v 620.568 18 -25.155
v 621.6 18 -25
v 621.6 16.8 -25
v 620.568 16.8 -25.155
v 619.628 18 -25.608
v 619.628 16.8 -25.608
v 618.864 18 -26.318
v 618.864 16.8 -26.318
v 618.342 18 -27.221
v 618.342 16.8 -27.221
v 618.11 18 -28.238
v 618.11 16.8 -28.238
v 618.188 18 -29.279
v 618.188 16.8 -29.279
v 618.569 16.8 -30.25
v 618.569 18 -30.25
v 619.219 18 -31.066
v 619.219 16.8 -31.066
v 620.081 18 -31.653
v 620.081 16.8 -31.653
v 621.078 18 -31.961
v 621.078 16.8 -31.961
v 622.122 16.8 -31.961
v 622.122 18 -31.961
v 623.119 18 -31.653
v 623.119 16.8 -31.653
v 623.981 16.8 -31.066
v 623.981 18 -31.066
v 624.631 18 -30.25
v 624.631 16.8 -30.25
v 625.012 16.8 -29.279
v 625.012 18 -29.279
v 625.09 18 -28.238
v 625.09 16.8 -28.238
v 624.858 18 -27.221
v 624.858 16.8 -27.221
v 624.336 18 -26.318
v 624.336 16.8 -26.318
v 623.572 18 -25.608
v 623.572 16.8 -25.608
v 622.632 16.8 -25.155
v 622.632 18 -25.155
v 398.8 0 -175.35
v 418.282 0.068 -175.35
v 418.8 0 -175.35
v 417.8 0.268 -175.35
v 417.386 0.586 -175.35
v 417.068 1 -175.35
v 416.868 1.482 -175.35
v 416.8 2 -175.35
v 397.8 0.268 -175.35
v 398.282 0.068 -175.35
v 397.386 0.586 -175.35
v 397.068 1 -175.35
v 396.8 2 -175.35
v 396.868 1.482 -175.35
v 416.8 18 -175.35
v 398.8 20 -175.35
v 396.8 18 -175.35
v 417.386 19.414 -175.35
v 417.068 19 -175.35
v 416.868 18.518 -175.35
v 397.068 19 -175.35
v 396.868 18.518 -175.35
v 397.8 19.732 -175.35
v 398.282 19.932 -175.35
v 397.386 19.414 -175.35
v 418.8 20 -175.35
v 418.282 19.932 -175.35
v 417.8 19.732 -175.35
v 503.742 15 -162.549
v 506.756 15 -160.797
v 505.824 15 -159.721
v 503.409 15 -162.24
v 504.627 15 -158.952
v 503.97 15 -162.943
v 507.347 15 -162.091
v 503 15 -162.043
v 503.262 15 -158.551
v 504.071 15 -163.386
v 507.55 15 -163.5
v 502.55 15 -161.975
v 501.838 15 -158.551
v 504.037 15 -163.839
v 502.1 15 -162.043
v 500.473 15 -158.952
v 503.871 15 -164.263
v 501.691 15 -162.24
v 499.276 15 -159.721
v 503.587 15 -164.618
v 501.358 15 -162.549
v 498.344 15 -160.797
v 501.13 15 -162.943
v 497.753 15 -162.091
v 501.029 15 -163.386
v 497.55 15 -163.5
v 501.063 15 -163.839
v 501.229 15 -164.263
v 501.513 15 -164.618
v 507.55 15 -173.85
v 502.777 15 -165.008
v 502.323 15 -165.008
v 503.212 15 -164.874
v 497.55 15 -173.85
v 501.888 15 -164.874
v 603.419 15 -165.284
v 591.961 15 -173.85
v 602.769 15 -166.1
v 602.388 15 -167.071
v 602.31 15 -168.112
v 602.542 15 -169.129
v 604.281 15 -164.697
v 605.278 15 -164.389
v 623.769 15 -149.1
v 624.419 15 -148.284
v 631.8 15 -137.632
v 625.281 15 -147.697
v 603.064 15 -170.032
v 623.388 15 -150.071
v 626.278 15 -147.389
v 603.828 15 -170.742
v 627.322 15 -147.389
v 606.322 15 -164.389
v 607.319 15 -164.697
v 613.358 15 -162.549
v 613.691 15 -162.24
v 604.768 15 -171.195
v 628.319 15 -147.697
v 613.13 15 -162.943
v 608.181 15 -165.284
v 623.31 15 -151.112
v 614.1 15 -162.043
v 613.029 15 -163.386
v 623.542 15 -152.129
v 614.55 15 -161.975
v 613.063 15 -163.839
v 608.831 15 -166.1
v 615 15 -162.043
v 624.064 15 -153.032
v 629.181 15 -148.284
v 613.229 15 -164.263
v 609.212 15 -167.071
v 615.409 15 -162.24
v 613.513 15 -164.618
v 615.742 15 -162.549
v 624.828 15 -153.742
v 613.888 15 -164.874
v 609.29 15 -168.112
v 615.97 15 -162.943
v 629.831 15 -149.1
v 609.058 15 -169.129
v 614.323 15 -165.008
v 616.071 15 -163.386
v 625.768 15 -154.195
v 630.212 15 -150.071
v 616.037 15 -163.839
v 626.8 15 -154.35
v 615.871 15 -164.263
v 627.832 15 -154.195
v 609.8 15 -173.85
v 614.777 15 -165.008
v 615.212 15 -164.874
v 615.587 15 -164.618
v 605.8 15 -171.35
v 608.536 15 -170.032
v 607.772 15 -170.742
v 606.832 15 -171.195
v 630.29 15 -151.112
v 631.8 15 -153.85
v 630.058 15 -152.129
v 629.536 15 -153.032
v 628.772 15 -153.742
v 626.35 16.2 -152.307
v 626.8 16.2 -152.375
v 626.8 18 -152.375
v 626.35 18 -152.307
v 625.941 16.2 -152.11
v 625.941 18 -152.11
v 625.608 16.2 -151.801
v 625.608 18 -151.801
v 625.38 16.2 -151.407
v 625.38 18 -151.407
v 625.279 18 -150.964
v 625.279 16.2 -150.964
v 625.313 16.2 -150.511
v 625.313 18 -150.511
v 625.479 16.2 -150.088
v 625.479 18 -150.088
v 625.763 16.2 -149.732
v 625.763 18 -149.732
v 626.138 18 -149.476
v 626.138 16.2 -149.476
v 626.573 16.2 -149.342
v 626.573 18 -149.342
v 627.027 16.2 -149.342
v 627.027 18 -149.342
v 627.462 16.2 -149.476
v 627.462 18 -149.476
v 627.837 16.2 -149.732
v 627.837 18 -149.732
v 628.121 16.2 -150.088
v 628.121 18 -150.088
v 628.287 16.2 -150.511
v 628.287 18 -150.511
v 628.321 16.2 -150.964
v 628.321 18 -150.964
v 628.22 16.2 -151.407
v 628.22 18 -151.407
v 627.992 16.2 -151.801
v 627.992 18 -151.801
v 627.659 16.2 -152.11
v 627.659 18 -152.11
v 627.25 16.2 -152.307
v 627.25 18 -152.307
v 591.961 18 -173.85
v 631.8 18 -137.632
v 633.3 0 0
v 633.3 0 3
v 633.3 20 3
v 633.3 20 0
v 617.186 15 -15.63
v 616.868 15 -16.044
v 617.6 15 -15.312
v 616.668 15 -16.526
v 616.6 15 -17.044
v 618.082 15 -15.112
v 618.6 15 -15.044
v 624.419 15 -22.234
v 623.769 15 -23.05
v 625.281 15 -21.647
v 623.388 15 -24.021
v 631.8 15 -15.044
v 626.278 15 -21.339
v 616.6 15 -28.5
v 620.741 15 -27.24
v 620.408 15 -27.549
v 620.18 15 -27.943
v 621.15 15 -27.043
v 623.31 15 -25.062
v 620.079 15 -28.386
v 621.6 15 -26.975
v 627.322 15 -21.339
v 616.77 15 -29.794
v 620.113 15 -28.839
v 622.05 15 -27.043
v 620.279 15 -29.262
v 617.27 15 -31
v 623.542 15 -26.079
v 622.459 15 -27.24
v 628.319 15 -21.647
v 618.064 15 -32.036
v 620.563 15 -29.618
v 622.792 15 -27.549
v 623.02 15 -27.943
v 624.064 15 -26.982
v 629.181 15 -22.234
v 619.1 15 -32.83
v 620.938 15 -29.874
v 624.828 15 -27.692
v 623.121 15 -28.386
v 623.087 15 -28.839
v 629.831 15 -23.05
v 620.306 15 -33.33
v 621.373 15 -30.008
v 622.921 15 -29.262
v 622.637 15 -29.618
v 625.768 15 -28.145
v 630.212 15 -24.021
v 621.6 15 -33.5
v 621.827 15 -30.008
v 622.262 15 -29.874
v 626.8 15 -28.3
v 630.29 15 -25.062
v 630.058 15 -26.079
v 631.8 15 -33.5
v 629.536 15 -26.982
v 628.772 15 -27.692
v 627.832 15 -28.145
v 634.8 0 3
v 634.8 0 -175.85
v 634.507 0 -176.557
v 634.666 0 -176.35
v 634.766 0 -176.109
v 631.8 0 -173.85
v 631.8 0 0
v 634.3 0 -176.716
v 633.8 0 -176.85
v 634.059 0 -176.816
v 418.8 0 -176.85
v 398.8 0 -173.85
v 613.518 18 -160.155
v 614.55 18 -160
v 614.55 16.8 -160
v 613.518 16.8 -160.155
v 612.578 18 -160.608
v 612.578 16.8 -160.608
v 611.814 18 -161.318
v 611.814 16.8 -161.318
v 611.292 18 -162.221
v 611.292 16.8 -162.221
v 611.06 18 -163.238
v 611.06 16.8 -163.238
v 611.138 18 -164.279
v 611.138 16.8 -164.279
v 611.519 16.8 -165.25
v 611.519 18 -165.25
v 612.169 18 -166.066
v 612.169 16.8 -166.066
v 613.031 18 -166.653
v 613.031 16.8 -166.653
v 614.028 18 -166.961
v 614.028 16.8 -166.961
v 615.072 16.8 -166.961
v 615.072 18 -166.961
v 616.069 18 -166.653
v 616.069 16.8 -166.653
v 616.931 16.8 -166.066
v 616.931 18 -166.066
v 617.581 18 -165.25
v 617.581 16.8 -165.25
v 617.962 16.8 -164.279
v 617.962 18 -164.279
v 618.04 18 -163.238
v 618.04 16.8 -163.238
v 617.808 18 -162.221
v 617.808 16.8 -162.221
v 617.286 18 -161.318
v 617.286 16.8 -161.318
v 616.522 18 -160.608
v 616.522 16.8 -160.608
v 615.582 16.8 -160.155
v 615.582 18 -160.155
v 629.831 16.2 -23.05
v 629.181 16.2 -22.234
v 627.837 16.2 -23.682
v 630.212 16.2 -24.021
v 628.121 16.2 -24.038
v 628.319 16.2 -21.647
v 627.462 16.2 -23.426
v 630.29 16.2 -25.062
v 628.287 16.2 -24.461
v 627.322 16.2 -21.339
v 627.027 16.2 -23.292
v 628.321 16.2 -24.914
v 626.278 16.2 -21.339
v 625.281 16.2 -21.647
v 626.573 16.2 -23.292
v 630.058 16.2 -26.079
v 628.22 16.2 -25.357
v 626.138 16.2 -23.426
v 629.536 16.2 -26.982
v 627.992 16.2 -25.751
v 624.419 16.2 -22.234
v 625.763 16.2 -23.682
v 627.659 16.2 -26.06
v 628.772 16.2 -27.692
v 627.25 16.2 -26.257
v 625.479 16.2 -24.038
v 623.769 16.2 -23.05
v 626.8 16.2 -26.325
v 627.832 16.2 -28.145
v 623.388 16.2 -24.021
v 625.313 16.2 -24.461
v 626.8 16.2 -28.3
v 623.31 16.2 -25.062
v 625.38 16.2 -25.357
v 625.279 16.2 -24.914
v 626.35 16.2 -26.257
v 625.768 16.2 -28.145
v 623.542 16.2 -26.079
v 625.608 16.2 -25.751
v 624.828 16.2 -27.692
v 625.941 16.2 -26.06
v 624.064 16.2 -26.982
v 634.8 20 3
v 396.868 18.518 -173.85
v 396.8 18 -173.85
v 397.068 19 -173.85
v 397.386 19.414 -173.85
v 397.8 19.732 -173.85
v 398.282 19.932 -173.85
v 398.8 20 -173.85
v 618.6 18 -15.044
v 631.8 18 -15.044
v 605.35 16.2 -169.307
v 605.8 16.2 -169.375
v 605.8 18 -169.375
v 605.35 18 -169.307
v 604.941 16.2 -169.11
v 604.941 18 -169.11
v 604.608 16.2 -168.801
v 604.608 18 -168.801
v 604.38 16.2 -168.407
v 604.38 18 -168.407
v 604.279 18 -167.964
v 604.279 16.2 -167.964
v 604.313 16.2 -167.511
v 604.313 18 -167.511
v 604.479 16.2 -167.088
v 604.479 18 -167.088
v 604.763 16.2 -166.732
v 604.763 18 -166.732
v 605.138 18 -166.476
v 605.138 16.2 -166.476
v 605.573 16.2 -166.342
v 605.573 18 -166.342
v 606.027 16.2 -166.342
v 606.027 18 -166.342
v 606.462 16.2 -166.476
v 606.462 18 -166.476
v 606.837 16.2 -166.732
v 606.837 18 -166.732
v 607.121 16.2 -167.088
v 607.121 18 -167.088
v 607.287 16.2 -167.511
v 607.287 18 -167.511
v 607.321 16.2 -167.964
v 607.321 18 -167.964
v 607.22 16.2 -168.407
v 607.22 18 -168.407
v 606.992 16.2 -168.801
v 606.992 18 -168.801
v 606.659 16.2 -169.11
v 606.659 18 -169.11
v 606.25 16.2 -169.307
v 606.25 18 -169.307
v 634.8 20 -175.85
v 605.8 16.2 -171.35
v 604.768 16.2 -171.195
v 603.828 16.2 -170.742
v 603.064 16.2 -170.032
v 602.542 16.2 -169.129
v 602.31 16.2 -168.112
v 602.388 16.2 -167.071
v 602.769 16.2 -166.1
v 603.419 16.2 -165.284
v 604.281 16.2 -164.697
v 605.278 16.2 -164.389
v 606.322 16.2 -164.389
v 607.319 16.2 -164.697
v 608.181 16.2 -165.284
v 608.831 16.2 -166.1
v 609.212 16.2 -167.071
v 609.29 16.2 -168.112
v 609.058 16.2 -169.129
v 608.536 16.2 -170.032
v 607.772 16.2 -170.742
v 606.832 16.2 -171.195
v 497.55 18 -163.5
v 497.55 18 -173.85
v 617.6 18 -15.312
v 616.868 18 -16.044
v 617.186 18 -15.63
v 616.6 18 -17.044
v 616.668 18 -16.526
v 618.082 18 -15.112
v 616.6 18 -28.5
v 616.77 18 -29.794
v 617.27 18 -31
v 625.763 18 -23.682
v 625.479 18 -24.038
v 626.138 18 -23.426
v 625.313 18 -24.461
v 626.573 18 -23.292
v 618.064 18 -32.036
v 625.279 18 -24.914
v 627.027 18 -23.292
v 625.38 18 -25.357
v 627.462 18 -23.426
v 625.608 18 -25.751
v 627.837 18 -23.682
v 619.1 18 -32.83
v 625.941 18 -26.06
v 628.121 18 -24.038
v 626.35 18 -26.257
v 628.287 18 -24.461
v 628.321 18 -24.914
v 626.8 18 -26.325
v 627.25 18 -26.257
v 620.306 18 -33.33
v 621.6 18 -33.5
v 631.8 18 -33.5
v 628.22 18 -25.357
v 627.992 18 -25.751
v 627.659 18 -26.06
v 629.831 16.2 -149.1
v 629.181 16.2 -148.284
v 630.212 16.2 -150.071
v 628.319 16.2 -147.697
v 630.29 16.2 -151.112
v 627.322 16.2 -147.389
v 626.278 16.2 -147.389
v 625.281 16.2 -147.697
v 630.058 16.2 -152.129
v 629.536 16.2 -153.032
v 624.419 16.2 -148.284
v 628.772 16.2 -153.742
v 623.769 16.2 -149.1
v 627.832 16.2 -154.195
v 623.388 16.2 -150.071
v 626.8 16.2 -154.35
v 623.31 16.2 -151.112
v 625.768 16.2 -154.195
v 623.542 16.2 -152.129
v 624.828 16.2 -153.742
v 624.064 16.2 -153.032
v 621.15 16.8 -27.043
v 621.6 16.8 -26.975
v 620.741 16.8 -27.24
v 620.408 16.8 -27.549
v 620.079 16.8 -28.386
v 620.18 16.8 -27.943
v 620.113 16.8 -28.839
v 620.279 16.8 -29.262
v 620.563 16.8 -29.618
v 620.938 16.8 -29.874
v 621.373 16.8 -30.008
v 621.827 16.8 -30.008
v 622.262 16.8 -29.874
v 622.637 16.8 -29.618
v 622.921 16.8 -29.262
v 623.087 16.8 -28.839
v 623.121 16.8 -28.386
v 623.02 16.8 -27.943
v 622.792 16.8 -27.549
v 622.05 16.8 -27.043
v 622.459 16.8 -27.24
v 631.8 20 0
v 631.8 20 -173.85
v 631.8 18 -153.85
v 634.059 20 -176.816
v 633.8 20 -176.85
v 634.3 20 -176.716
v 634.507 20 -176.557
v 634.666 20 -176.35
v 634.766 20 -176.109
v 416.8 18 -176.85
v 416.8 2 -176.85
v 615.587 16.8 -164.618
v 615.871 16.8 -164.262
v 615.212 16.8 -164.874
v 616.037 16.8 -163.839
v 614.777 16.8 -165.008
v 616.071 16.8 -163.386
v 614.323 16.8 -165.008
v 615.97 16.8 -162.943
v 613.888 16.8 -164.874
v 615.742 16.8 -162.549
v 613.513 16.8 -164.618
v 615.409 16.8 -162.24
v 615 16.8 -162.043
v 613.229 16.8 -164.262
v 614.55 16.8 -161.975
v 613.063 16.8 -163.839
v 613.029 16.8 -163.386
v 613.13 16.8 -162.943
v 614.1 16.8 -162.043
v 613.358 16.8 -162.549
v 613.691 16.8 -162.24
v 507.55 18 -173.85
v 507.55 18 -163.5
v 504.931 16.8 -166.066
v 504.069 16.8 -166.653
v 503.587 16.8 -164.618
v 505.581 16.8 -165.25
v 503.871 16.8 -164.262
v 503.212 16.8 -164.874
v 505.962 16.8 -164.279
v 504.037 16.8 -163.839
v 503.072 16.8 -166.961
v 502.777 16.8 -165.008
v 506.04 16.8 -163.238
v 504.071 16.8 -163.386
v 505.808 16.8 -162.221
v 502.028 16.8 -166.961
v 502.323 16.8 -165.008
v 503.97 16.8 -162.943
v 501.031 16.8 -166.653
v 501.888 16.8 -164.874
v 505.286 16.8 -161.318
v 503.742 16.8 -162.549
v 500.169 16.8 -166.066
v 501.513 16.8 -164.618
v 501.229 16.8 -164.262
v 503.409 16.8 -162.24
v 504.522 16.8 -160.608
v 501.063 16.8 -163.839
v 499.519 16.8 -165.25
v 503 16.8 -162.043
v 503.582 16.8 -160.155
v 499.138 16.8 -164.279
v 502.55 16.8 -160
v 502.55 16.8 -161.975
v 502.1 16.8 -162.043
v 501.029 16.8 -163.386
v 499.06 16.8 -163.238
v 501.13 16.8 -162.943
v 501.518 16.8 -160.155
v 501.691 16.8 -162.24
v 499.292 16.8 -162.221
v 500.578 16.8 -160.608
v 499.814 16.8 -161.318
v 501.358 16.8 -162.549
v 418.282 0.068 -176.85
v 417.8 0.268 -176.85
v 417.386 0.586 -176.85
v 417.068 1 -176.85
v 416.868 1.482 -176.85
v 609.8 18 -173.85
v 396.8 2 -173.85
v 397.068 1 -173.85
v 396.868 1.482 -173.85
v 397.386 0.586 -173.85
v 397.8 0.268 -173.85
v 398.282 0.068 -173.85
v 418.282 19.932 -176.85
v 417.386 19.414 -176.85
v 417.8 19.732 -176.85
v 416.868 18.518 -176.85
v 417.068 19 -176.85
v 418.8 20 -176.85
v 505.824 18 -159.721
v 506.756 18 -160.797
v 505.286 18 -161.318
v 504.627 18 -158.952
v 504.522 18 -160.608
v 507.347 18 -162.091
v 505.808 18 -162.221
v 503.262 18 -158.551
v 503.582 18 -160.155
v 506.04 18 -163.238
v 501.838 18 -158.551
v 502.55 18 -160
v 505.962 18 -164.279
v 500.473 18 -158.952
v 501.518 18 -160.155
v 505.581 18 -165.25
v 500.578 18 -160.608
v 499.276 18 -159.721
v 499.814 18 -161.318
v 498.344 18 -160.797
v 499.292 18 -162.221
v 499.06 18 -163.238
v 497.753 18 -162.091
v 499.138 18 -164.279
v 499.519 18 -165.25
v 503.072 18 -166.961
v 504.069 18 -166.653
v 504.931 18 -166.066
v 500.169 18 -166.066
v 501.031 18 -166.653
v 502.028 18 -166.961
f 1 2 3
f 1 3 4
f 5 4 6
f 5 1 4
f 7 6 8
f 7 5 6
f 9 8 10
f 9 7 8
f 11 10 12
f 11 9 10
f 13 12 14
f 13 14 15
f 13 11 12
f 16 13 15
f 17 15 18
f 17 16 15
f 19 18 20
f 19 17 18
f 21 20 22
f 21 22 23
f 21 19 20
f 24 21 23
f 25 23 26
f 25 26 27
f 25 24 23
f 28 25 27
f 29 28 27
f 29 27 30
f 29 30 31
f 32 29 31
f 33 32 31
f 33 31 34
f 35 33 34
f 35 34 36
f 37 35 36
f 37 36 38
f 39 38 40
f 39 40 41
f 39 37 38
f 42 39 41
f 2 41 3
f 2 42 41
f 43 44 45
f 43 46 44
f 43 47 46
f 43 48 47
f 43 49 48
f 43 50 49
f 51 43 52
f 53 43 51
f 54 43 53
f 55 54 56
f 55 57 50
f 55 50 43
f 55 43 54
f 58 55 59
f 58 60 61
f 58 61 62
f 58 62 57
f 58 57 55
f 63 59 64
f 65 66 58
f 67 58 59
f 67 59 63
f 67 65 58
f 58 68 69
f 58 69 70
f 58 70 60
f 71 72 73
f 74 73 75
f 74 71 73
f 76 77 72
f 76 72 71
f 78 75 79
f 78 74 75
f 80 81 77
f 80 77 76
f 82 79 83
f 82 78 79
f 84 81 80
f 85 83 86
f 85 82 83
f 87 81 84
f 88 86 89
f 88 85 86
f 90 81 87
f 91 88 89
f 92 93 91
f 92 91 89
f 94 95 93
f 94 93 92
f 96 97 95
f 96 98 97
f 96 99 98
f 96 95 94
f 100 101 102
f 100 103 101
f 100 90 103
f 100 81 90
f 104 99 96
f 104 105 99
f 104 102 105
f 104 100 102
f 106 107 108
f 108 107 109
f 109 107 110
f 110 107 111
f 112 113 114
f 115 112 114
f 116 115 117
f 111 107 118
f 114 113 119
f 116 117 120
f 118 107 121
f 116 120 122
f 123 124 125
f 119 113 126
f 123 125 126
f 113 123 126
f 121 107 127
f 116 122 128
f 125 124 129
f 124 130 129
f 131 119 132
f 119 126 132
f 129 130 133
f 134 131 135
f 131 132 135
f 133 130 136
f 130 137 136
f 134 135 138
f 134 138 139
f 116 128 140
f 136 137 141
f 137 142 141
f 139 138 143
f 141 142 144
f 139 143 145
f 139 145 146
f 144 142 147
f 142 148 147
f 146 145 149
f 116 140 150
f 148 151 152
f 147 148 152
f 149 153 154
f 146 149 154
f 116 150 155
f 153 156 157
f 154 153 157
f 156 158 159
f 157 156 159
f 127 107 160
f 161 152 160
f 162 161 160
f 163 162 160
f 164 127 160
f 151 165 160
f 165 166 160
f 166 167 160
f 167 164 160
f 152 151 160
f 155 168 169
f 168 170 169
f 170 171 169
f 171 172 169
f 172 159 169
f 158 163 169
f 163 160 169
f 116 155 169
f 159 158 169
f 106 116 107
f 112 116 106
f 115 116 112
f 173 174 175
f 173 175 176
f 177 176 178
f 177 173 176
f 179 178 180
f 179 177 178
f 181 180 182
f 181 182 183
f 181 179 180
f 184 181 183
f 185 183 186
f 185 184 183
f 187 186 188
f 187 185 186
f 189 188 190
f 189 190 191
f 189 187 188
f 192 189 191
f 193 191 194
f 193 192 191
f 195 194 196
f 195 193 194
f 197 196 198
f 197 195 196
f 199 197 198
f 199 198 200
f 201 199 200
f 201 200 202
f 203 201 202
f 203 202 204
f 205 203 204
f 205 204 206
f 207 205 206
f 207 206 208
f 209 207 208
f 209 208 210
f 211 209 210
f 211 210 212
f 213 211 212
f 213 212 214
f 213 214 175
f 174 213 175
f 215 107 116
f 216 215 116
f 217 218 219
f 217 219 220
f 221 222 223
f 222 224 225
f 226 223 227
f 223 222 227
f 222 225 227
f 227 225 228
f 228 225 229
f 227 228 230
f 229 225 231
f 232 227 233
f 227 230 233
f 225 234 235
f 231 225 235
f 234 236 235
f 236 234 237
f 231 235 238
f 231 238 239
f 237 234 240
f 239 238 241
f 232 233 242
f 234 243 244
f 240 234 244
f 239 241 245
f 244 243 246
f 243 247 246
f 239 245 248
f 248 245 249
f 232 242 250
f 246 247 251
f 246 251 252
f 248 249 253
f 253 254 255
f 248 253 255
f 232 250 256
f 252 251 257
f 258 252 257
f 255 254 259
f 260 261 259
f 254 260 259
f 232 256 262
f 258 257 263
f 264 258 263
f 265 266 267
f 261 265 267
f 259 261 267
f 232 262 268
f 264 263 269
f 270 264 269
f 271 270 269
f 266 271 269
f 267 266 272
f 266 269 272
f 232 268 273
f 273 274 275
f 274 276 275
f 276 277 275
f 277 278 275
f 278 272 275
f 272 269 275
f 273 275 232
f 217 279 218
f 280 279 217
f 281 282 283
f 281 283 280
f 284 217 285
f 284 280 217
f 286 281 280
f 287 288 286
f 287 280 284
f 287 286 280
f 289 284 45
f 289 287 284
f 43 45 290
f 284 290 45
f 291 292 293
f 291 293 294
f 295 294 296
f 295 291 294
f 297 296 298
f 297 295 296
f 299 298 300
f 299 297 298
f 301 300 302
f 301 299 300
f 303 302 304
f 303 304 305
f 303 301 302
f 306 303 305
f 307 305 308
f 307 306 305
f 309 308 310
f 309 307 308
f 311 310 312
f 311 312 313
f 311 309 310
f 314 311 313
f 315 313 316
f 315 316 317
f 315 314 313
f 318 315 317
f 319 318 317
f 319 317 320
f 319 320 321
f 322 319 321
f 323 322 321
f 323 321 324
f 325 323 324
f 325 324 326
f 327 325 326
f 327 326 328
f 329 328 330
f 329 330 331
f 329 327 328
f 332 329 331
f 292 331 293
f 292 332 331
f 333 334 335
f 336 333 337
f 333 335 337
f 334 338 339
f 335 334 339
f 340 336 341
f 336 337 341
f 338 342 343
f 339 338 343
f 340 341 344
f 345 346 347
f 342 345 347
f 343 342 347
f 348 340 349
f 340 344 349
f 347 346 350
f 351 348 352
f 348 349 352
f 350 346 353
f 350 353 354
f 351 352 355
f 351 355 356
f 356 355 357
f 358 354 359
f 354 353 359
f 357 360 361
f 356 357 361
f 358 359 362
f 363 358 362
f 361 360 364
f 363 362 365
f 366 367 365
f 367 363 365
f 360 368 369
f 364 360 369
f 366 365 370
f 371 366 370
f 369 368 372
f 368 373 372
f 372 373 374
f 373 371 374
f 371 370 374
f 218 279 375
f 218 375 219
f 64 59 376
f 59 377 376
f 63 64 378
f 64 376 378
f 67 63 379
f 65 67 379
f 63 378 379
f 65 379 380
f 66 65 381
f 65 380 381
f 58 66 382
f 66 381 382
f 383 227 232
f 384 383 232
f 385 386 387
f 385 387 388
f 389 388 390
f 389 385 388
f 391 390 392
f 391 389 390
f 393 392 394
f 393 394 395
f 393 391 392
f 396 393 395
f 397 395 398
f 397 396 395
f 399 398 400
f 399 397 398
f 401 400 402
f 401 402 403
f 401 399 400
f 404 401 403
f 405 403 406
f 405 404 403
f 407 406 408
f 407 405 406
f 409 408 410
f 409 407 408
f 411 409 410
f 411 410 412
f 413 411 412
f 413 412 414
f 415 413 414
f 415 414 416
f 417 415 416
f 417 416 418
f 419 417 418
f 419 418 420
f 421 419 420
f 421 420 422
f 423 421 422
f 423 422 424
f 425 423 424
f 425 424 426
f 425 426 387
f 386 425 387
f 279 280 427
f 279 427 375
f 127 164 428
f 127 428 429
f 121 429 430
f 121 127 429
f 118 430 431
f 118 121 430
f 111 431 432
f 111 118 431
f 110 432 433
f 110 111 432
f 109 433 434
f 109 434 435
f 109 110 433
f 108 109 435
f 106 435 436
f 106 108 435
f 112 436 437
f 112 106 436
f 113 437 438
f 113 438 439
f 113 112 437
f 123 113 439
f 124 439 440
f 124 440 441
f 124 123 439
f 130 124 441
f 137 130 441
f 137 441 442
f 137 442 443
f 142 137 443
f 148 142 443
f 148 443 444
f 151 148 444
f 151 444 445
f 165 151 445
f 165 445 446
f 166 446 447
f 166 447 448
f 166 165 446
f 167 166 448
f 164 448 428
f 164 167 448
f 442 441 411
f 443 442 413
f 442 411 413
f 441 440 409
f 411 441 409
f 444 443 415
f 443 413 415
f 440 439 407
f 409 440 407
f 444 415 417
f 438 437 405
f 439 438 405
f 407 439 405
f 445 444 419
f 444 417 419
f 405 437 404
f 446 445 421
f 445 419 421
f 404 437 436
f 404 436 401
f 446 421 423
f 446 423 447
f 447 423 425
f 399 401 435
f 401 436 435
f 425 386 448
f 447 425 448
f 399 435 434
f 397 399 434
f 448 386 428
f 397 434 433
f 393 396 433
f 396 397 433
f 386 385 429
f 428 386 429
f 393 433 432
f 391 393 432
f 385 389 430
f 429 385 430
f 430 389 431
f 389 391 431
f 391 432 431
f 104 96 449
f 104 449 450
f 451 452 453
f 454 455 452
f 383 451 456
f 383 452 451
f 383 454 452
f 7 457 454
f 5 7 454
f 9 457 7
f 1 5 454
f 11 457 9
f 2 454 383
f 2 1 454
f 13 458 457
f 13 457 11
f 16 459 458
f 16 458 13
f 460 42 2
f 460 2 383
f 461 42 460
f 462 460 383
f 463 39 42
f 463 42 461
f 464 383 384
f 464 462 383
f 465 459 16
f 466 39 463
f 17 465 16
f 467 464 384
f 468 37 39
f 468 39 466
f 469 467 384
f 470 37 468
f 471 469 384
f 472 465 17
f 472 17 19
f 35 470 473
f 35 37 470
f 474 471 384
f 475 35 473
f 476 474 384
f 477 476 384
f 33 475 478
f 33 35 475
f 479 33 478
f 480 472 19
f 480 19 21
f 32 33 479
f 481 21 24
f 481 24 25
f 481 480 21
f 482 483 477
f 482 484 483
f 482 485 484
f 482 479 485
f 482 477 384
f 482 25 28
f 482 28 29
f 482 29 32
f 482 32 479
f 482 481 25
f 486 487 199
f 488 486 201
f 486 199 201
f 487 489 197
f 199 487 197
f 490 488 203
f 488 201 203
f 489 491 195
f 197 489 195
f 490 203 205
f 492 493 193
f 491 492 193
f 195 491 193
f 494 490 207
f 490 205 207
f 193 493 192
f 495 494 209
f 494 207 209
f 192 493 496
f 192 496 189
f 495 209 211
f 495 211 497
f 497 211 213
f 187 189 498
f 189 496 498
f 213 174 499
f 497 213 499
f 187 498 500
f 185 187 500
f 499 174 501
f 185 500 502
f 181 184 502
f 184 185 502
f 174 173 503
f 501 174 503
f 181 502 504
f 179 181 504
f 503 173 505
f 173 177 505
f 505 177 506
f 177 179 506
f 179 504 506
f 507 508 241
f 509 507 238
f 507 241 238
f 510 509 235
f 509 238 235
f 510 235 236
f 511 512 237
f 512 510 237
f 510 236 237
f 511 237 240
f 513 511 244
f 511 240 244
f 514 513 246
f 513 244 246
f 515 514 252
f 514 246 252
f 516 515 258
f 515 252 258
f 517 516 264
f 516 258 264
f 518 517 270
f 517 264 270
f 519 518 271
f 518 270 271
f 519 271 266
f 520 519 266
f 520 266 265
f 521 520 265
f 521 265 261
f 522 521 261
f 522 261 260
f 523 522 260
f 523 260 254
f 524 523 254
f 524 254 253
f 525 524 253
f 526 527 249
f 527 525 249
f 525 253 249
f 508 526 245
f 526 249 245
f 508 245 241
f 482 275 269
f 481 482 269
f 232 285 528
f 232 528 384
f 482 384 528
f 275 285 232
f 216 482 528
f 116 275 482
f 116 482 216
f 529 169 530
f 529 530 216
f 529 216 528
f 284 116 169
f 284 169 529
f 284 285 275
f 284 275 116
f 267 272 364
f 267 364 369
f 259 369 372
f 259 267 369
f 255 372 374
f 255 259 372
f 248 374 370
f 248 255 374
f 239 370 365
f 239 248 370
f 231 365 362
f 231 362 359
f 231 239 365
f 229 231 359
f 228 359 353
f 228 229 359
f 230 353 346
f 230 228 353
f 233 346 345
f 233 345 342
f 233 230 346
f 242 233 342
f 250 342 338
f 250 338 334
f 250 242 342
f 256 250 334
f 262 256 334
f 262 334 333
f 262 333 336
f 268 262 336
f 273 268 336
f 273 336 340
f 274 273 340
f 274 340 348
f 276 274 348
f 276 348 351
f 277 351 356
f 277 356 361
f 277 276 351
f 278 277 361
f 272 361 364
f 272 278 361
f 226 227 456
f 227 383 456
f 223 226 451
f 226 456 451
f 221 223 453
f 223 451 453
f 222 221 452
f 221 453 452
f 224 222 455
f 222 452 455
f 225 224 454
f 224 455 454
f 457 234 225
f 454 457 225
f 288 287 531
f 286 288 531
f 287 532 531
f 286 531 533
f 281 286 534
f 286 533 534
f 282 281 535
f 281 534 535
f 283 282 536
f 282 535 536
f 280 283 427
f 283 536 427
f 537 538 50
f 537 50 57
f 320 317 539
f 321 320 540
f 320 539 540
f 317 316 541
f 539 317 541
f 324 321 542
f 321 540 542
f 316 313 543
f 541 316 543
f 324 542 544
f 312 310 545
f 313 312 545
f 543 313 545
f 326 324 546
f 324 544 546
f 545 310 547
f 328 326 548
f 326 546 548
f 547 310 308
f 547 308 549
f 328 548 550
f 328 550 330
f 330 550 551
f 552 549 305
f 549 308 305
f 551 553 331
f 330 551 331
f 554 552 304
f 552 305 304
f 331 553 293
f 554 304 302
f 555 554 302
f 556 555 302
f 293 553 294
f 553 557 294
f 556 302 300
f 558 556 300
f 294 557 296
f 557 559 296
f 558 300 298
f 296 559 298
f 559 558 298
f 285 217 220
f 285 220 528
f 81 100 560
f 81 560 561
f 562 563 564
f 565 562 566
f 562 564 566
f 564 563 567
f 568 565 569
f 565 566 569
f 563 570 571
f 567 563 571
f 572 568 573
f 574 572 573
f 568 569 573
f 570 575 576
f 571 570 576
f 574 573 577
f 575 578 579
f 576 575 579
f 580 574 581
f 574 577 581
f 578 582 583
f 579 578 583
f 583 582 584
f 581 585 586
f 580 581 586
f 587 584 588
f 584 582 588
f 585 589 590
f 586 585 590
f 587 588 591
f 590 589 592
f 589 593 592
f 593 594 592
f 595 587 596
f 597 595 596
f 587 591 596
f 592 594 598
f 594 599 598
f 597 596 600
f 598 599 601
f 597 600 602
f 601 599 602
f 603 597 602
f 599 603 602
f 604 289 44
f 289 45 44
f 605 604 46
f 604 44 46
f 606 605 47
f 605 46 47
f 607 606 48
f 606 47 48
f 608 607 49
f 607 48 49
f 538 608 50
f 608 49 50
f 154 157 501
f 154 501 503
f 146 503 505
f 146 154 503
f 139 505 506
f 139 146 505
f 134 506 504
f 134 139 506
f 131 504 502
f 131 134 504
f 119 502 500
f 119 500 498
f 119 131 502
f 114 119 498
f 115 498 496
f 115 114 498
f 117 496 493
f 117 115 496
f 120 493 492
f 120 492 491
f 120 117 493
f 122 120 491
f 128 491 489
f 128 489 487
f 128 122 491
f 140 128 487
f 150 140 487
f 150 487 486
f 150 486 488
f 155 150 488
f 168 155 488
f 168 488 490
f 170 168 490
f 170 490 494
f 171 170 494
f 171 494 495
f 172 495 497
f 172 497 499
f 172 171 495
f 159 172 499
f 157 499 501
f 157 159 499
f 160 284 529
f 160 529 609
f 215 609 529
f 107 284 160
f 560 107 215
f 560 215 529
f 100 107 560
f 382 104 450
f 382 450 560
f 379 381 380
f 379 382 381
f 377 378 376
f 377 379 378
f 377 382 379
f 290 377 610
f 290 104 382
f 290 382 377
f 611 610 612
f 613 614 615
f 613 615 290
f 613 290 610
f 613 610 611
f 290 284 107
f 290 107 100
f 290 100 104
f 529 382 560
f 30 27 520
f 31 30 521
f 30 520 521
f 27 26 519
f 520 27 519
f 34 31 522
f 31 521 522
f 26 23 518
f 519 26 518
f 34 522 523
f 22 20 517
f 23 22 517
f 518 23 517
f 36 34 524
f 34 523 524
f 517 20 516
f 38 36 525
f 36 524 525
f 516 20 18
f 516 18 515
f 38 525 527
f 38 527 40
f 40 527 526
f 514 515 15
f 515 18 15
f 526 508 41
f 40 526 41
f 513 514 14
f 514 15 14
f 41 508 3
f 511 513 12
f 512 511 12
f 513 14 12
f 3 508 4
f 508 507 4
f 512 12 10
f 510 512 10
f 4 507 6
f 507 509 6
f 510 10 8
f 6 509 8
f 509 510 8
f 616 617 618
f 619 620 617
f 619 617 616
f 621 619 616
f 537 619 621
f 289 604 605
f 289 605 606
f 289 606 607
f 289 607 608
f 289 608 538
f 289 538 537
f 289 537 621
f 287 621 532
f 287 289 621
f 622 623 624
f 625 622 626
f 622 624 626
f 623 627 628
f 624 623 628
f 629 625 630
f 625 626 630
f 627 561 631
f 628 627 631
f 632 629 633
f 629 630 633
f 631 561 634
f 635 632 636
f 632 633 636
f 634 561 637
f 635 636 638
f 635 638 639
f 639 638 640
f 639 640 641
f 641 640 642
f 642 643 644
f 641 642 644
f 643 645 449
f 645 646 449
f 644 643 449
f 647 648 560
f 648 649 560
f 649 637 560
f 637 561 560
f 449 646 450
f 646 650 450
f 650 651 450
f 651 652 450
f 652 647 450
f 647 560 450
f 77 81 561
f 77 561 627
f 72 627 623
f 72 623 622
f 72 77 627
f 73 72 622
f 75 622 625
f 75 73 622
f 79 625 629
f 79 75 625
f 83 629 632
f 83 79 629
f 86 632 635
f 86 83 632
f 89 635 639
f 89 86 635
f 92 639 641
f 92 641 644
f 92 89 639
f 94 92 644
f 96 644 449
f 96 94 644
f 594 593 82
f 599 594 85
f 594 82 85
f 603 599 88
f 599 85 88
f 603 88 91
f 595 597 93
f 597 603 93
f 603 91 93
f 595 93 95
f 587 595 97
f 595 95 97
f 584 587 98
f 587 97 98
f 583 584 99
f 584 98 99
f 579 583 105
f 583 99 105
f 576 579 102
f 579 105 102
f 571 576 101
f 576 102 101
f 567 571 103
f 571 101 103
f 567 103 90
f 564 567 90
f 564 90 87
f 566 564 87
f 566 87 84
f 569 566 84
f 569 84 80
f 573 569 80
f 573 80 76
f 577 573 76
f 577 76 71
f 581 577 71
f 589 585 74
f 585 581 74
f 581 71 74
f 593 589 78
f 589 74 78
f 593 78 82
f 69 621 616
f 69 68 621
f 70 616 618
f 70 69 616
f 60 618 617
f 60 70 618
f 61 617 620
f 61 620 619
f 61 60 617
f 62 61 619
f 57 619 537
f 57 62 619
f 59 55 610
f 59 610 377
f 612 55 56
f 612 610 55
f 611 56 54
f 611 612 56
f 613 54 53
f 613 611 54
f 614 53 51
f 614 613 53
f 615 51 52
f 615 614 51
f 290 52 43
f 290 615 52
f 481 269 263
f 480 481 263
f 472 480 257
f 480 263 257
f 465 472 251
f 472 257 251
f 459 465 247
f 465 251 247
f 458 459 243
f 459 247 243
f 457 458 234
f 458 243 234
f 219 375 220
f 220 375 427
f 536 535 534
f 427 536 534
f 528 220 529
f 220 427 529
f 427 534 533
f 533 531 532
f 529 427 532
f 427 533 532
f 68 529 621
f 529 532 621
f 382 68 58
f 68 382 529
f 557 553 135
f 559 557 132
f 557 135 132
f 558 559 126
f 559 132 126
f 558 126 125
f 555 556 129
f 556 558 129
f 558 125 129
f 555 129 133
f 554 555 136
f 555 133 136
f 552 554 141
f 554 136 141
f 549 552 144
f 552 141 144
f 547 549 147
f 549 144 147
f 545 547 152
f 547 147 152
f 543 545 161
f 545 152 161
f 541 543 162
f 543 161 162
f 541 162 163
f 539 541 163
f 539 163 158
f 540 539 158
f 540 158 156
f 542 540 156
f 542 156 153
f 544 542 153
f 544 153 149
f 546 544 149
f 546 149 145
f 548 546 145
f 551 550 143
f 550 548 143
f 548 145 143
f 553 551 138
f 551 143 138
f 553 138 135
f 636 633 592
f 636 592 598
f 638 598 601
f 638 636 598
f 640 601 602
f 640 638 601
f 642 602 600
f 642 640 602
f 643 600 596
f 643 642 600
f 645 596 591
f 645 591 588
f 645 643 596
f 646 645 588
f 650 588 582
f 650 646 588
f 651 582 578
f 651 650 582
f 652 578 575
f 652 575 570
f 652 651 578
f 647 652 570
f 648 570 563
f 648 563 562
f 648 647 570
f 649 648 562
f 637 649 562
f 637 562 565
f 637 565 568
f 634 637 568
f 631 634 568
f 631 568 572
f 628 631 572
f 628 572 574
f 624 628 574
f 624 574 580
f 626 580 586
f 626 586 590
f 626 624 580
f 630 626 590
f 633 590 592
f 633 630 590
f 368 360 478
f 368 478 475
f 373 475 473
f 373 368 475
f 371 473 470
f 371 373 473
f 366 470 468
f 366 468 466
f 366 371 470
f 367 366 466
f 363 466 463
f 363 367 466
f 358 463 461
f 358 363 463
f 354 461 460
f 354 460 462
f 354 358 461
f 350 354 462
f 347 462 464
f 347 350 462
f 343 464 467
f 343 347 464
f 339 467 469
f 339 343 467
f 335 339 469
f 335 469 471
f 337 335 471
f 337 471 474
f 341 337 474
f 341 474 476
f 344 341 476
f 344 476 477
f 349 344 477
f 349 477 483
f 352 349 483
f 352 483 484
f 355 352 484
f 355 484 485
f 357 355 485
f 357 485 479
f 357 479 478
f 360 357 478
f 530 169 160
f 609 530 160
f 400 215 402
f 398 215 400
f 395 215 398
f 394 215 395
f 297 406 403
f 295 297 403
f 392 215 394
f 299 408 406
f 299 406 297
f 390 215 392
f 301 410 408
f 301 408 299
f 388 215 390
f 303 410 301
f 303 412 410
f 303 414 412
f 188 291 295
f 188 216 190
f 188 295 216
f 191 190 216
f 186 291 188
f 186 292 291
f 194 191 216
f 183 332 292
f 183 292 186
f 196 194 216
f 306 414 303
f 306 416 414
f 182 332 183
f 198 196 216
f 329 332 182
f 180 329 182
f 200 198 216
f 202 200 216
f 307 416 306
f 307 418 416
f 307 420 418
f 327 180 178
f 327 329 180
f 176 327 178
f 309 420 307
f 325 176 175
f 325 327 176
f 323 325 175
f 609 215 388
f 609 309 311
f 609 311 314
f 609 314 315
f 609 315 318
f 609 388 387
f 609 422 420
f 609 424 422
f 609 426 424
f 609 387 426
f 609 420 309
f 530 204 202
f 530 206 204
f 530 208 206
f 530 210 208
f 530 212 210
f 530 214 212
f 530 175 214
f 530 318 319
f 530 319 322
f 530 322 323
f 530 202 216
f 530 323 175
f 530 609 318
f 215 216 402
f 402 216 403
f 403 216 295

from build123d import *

# Parameters (mm, degrees)
EXTRUDE_1_DEPTH     = 20
EXTRUDE_START       = 1
SKETCH_2_R          = 1.525
EXTRUDE_2_DEPTH     = 3
CUT_EXTRUDE_1_REACH = 358.708
SKETCH_3_W          = 31
SKETCH_3_H          = 9.5
SKETCH_4_R          = 3.5
CUT_EXTRUDE_2_DEPTH = 1.2
CUT_EXTRUDE_3_REACH = 356.959
SKETCH_5_R          = 1.525
FILLET_1_R          = 1
FILLET_3_R          = 1
SKETCH_6_R          = 3.5
CUT_EXTRUDE_4_DEPTH = 1.2
SKETCH_7_W          = 69.4
SKETCH_7_H          = 20
CUT_EXTRUDE_5_DEPTH = 3
SKETCH_8_W          = 20
SKETCH_8_H          = 20
CUT_EXTRUDE_6_DEPTH = 1.5
FILLET_4_R          = 2
FILLET_5_R          = 2
FILLET_6_R          = 2


with BuildPart() as part:
    # 草图1 → 凸台-拉伸1 (new body)
    with BuildSketch(Plane(origin=(0, 0, 0), x_dir=(1, 0, 0), z_dir=(0, 1, 0))):
        Polygon((1.5, 0), (3, 0), (3, 173.85), (307.4, 173.85), (307.4, 176.85), (0, 176.85), (0, 0), (0, -3), (1.5, -3), align=None)
    extrude(amount=EXTRUDE_1_DEPTH)

    # 草图2 → 凸台-拉伸2 (add)
    # profile 1 of 3: a face of its own
    with BuildSketch(Plane(origin=(0, 14, 0), x_dir=(1, 0, 0), z_dir=(0, 1, 0)).offset(EXTRUDE_START)):
        Polygon((3, 153.85), (25, 173.85), (42.839282497, 173.85), (3, 137.632470457), align=None)
        with Locations(Location((20.25, 163.5, 0), (0, 0, 270))):
            Circle(SKETCH_2_R, mode=Mode.SUBTRACT)
    # profile 2 of 3: a face of its own
    with BuildSketch(Plane(origin=(0, 14, 0), x_dir=(1, 0, 0), z_dir=(0, 1, 0)).offset(EXTRUDE_START)):
        with BuildLine():
            Line((137.25, 163.5), (137.25, 173.85))
            Line((137.25, 173.85), (127.25, 173.85))
            Line((127.25, 173.85), (127.25, 163.5))
            ThreePointArc((127.25, 163.5), (132.25, 158.5), (137.25, 163.5))
        make_face()
        with Locations(Location((132.25, 163.5, 0), (0, 0, 270))):
            Circle(SKETCH_2_R, mode=Mode.SUBTRACT)
    # profile 3 of 3: a face of its own
    with BuildSketch(Plane(origin=(0, 14, 0), x_dir=(1, 0, 0), z_dir=(0, 1, 0)).offset(EXTRUDE_START)):
        with BuildLine():
            Line((3, 23.870342351), (3, 33.5))
            Line((3, 33.5), (13.2, 33.5))
            ThreePointArc((13.2, 33.5), (16.735533906, 32.035533906), (18.2, 28.5))
            Line((18.2, 28.5), (18.2, 15.043961292))
            Line((18.2, 15.043961292), (3, 15.043961292))
            Line((3, 15.043961292), (3, 23.870342351))
        make_face()
        with Locations(Location((13.2, 28.5, 0), (0, 0, 270))):
            Circle(SKETCH_2_R, mode=Mode.SUBTRACT)
    extrude(amount=EXTRUDE_2_DEPTH)

    # 草图3 → 切除-拉伸1 (cut, up to next)
    with BuildSketch(Plane(origin=(0, 0, -176.85), x_dir=(-1, 0, 0), z_dir=(0, 0, -1)), mode=Mode.PRIVATE) as cut_extrude_1_sk1:
        with Locations((-291.9, 15.25)):
            Rectangle(SKETCH_3_W, SKETCH_3_H)
    cut_extrude_1_tool1 = extrude(cut_extrude_1_sk1.sketch, amount=-CUT_EXTRUDE_1_REACH, mode=Mode.PRIVATE) & part.part
    add(cut_extrude_1_tool1.solids().sort_by_distance((291.9, 15.25, -176.85))[0], mode=Mode.SUBTRACT)

    # 草图4 → 切除-拉伸2 (cut)
    with BuildSketch(Plane(origin=(0, 18, 0), x_dir=(1, 0, 0), z_dir=(0, 1, 0))):
        with Locations(Location((13.2, 28.5, 0), (0, 0, 270))):
            Circle(SKETCH_4_R)
        with Locations(Location((20.25, 163.5, 0), (0, 0, 270))):
            Circle(SKETCH_4_R)
        with Locations(Location((132.25, 163.5, 0), (0, 0, 270))):
            Circle(SKETCH_4_R)
    extrude(amount=-CUT_EXTRUDE_2_DEPTH, mode=Mode.SUBTRACT)

    # 草图5 → 切除-拉伸3 (cut, up to next)
    with BuildSketch(Plane.XZ.offset(-15), mode=Mode.PRIVATE) as cut_extrude_3_sk1:
        with Locations(Location((29, -167.85, 0), (0, 0, 270))):
            Circle(SKETCH_5_R)
    cut_extrude_3_tool1 = extrude(cut_extrude_3_sk1.sketch, amount=-CUT_EXTRUDE_3_REACH, mode=Mode.PRIVATE) & part.part
    # 草图5 → 切除-拉伸3 (cut, up to next)
    with BuildSketch(Plane.XZ.offset(-15), mode=Mode.PRIVATE) as cut_extrude_3_sk2:
        with Locations(Location((8, -150.85, 0), (0, 0, 270))):
            Circle(SKETCH_5_R)
    cut_extrude_3_tool2 = extrude(cut_extrude_3_sk2.sketch, amount=-CUT_EXTRUDE_3_REACH, mode=Mode.PRIVATE) & part.part
    # 草图5 → 切除-拉伸3 (cut, up to next)
    with BuildSketch(Plane.XZ.offset(-15), mode=Mode.PRIVATE) as cut_extrude_3_sk3:
        with Locations(Location((8, -24.8, 0), (0, 0, 270))):
            Circle(SKETCH_5_R)
    cut_extrude_3_tool3 = extrude(cut_extrude_3_sk3.sketch, amount=-CUT_EXTRUDE_3_REACH, mode=Mode.PRIVATE) & part.part
    add(cut_extrude_3_tool1.solids().sort_by_distance((29, 15, -167.85))[0], mode=Mode.SUBTRACT)
    add(cut_extrude_3_tool2.solids().sort_by_distance((8, 15, -150.85))[0], mode=Mode.SUBTRACT)
    add(cut_extrude_3_tool3.solids().sort_by_distance((8, 15, -24.8))[0], mode=Mode.SUBTRACT)

    # 圆角1
    fillet_1_edges = [part.edges().sort_by_distance(p)[0] for p in [
        (0, 10, -176.85),
    ]]
    fillet(fillet_1_edges, radius=FILLET_1_R)

    # 圆角3
    fillet_3_edges = [part.edges().sort_by_distance(p)[0] for p in [
        (276.4, 10.5, -175.35),
    ]]
    fillet(fillet_3_edges, radius=FILLET_3_R)

    # 草图6 → 切除-拉伸4 (cut)
    with BuildSketch(Plane.XZ.offset(-15)):
        with Locations(Location((8, -24.8, 0), (0, 0, 270))):
            Circle(SKETCH_6_R)
        with Locations(Location((8, -150.85, 0), (0, 0, 270))):
            Circle(SKETCH_6_R)
        with Locations(Location((29, -167.85, 0), (0, 0, 270))):
            Circle(SKETCH_6_R)
    extrude(amount=-CUT_EXTRUDE_4_DEPTH, mode=Mode.SUBTRACT)

    # 草图7 → 切除-拉伸5 (cut)
    with BuildSketch(Plane(origin=(0, 0, -176.85), x_dir=(-1, 0, 0), z_dir=(0, 0, -1))):
        with Locations((-272.7, 10)):
            Rectangle(SKETCH_7_W, SKETCH_7_H)
    extrude(amount=-CUT_EXTRUDE_5_DEPTH, mode=Mode.SUBTRACT)


with BuildPart() as body_2:
    # 镜向3: mirrored copy
    add(part.part.mirror(Plane(origin=(317.4, 0, 0), x_dir=(0, 0, 1), z_dir=(1, 0, 0))))

    # 草图8 → 切除-拉伸6 (cut)
    with BuildSketch(Plane(origin=(0, 0, -176.85), x_dir=(-1, 0, 0), z_dir=(0, 0, -1))):
        with Locations((-406.8, 10)):
            Rectangle(SKETCH_8_W, SKETCH_8_H)
    extrude(amount=-CUT_EXTRUDE_6_DEPTH, mode=Mode.SUBTRACT)

    # 圆角4
    fillet_4_edges = [body_2.edges().sort_by_distance(p)[0] for p in [
        (416.8, 0, -176.1),
        (416.8, 20, -176.1),
    ]]
    fillet(fillet_4_edges, radius=FILLET_4_R)

    # 圆角5
    fillet_5_edges = [body_2.edges().sort_by_distance(p)[0] for p in [
        (396.8, 20, -174.6),
        (396.8, 0, -174.6),
    ]]
    fillet(fillet_5_edges, radius=FILLET_5_R)

    # 圆角6
    fillet_6_edges = [body_2.edges().sort_by_distance(p)[0] for p in [
        (616.6, 16.5, -15.043961292),
    ]]
    fillet(fillet_6_edges, radius=FILLET_6_R)


solid = body_2.part
